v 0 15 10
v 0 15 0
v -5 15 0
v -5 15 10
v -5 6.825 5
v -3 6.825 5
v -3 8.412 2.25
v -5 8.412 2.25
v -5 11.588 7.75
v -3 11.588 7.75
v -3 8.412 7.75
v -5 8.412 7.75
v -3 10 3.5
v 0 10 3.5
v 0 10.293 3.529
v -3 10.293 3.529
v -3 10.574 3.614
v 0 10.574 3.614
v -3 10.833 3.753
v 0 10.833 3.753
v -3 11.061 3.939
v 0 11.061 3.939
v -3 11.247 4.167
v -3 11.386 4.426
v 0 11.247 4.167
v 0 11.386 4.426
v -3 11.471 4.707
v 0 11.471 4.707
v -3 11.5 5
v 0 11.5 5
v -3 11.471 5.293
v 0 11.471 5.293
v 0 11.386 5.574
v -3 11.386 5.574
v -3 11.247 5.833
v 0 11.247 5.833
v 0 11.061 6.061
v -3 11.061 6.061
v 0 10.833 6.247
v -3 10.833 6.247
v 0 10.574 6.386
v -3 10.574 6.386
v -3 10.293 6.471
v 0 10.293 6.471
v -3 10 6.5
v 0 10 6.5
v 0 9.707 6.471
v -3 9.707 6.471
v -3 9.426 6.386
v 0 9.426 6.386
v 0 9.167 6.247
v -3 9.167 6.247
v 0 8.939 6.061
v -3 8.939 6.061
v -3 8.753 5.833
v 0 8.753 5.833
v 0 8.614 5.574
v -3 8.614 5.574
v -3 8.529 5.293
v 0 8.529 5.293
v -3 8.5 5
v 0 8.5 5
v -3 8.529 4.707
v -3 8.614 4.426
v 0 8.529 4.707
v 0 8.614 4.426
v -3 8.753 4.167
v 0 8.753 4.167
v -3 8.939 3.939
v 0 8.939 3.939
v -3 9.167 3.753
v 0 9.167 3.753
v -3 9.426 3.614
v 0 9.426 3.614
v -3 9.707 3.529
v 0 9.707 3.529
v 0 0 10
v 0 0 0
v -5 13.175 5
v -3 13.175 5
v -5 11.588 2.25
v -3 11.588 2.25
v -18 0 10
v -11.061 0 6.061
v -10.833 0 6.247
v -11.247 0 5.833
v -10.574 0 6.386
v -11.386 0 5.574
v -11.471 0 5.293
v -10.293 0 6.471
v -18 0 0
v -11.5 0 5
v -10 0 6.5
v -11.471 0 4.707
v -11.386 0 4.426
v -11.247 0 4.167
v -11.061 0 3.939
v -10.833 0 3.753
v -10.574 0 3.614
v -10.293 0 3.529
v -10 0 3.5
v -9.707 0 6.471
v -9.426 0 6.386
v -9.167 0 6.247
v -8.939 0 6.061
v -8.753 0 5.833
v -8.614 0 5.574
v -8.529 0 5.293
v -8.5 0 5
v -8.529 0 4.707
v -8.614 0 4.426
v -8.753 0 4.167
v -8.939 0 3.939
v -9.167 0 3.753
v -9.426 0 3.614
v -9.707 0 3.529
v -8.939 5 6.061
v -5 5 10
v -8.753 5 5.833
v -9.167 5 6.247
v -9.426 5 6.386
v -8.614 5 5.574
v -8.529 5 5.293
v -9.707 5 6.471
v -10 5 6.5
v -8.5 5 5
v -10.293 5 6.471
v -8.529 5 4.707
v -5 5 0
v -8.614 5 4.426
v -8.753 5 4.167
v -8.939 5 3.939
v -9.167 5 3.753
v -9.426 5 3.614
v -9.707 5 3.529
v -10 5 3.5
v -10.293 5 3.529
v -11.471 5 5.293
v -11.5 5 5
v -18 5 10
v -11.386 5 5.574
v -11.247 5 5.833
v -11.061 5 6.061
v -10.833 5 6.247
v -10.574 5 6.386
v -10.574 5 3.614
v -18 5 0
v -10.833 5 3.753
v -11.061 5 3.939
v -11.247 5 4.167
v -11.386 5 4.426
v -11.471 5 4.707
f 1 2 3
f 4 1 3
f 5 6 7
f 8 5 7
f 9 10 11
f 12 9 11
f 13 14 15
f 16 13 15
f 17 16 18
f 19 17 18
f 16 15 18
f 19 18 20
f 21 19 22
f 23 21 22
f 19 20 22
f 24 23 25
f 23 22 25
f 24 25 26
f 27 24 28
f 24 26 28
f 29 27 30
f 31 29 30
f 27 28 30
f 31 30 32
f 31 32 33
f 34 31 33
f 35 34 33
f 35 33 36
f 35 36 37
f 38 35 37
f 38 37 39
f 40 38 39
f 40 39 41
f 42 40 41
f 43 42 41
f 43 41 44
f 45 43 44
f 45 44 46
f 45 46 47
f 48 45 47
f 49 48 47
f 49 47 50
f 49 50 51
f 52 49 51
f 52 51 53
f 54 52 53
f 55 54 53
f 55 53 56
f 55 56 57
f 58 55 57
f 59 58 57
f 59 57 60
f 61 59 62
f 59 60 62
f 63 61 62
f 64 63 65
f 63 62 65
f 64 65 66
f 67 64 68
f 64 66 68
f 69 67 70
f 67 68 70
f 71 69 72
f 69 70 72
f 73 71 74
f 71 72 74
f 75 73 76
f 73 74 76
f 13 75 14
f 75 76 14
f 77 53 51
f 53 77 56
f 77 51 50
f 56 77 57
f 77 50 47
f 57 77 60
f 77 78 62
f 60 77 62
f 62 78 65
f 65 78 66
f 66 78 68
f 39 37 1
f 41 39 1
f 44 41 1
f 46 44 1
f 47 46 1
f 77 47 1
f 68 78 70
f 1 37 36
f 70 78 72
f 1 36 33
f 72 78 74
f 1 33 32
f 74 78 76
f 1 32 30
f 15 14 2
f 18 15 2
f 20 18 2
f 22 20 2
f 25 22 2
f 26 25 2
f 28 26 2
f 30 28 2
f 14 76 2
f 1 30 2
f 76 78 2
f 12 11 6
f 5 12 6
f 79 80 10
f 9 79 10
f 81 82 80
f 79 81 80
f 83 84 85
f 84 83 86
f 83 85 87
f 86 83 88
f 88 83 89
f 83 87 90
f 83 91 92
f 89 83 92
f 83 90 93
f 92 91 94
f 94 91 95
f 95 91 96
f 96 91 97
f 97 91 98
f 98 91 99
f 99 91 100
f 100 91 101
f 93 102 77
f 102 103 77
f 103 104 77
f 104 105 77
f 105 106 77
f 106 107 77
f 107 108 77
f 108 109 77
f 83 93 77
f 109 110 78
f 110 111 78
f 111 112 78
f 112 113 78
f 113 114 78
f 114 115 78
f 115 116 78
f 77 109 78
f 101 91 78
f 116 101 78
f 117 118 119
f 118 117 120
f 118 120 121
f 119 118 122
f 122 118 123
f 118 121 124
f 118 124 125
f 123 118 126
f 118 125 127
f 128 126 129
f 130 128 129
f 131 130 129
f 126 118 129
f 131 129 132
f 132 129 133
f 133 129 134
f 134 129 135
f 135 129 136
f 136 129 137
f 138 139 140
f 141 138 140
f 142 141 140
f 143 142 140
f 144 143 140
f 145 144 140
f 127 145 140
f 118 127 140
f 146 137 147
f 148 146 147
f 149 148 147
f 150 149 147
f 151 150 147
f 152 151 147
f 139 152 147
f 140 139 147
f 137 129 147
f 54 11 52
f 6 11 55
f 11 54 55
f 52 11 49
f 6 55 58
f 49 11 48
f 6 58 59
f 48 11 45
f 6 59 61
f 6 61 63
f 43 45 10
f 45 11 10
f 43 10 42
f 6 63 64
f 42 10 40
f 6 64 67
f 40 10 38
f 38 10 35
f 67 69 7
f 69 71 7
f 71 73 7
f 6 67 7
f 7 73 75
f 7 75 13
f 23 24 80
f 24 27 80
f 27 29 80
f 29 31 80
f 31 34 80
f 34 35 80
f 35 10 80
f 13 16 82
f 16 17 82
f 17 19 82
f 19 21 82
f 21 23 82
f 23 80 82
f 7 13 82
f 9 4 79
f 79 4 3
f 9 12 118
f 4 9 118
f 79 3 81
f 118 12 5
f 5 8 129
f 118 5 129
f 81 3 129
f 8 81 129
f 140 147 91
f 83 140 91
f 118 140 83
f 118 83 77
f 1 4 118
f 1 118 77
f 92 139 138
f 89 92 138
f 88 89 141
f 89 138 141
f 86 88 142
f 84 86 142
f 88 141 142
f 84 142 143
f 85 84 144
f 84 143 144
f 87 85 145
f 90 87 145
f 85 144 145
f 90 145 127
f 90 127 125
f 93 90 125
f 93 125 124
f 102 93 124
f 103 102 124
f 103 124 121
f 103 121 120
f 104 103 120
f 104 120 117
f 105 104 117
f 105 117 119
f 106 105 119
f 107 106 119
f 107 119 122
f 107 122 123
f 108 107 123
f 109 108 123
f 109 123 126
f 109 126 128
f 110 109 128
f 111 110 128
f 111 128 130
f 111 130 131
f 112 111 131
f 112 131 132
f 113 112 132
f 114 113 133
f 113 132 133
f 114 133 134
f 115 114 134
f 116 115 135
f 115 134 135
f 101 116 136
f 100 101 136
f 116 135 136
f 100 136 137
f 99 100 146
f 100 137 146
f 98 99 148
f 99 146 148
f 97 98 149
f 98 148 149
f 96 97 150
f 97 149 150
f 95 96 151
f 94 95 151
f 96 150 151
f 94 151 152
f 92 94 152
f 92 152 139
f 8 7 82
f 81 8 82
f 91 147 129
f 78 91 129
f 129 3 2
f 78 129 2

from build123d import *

# Parameters (mm, degrees)
EXTRUDE_1_DEPTH     = 10
CUT_EXTRUDE_1_REACH = 27.475
SKETCH_2_R          = 1.5
CUT_EXTRUDE_START   = -3
SKETCH_2_3_R        = 1.5
CUT_EXTRUDE_2_DEPTH = 2
CUT_EXTRUDE_3_REACH = 24.891
SKETCH_3_R          = 1.5


with BuildPart() as part:
    # 草图1 → 凸台-拉伸1 (new body)
    with BuildSketch(Plane.XY):
        Polygon((0, 0), (0, 15), (-5, 15), (-5, 5), (-18, 5), (-18, 0), align=None)
    extrude(amount=EXTRUDE_1_DEPTH)

    # 草图2 → 切除-拉伸1 (cut, up to next)
    with BuildSketch(Plane(origin=(0, 0, 0), x_dir=(0, 0, -1), z_dir=(1, 0, 0)), mode=Mode.PRIVATE) as cut_extrude_1_sk1:
        with Locations((-5, 10)):
            Circle(SKETCH_2_R)
    cut_extrude_1_tool1 = extrude(cut_extrude_1_sk1.sketch, amount=-CUT_EXTRUDE_1_REACH, mode=Mode.PRIVATE) & part.part
    add(cut_extrude_1_tool1.solids().sort_by_distance((0, 10, 5))[0], mode=Mode.SUBTRACT)

    # 草图2<3> → 切除-拉伸2 (cut)
    with BuildSketch(Plane(origin=(0, 0, 0), x_dir=(0, 0, -1), z_dir=(1, 0, 0)).offset(CUT_EXTRUDE_START)):
        Polygon((-5, 6.824573519), (-2.25, 8.41228676), (-2.25, 11.58771324), (-5, 13.175426481), (-7.75, 11.58771324), (-7.75, 8.41228676), align=None)
        with Locations((-5, 10)):
            Circle(SKETCH_2_3_R, mode=Mode.SUBTRACT)
    extrude(amount=-CUT_EXTRUDE_2_DEPTH, mode=Mode.SUBTRACT)

    # 草图3 → 切除-拉伸3 (cut, up to next)
    with BuildSketch(Plane(origin=(0, 5, 0), x_dir=(1, 0, 0), z_dir=(0, 1, 0)), mode=Mode.PRIVATE) as cut_extrude_3_sk1:
        with Locations(Location((-10, -5, 0), (0, 0, 180))):
            Circle(SKETCH_3_R)
    cut_extrude_3_tool1 = extrude(cut_extrude_3_sk1.sketch, amount=-CUT_EXTRUDE_3_REACH, mode=Mode.PRIVATE) & part.part
    add(cut_extrude_3_tool1.solids().sort_by_distance((-10, 5, 5))[0], mode=Mode.SUBTRACT)


solid = part.part
